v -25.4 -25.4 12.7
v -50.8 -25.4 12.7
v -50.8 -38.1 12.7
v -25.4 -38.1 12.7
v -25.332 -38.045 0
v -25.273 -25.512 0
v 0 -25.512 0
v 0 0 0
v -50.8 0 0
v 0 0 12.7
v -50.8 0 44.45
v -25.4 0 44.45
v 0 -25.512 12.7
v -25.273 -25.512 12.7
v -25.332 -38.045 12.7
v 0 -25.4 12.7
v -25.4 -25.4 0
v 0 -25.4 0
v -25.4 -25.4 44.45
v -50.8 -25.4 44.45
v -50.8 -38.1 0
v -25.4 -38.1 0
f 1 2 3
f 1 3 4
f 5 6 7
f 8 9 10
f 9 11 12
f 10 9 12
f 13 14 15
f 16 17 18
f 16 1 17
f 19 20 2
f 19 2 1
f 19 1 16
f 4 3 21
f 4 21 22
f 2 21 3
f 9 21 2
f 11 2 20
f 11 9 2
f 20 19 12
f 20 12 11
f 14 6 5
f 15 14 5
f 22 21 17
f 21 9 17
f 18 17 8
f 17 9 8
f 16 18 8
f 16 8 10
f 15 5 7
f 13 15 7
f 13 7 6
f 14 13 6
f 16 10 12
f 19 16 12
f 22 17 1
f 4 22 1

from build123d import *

# Parameters (mm, degrees)
F1_DEPTH = 25.4
F2_W     = 25.4
F2_H     = 12.7
F3_DEPTH = 12.7
F5_DEPTH = 12.7


with BuildPart() as f1:
    # F0 (on Front) → F1 (new body)
    with BuildSketch(Plane.XZ):
        Polygon((0, 0), (0, 12.7), (-25.4, 44.45), (-50.8, 44.45), (-50.8, 0), align=None)
    extrude(amount=F1_DEPTH)

    # F2 (on face) → F3 (join)
    with BuildSketch(Plane.XZ.offset(25.4)):
        with Locations((-38.1, 6.35)):
            Rectangle(F2_W, F2_H)
    extrude(amount=F3_DEPTH)


with BuildPart() as f5:
    # F4 (on Top) → F5 (new body)
    with BuildSketch(Plane.XY):
        Polygon((-25.273444, -25.511744), (-25.331819, -38.044803), (0, -25.511744), align=None)
    extrude(amount=F5_DEPTH)


solid = Compound([f1.part, f5.part])
